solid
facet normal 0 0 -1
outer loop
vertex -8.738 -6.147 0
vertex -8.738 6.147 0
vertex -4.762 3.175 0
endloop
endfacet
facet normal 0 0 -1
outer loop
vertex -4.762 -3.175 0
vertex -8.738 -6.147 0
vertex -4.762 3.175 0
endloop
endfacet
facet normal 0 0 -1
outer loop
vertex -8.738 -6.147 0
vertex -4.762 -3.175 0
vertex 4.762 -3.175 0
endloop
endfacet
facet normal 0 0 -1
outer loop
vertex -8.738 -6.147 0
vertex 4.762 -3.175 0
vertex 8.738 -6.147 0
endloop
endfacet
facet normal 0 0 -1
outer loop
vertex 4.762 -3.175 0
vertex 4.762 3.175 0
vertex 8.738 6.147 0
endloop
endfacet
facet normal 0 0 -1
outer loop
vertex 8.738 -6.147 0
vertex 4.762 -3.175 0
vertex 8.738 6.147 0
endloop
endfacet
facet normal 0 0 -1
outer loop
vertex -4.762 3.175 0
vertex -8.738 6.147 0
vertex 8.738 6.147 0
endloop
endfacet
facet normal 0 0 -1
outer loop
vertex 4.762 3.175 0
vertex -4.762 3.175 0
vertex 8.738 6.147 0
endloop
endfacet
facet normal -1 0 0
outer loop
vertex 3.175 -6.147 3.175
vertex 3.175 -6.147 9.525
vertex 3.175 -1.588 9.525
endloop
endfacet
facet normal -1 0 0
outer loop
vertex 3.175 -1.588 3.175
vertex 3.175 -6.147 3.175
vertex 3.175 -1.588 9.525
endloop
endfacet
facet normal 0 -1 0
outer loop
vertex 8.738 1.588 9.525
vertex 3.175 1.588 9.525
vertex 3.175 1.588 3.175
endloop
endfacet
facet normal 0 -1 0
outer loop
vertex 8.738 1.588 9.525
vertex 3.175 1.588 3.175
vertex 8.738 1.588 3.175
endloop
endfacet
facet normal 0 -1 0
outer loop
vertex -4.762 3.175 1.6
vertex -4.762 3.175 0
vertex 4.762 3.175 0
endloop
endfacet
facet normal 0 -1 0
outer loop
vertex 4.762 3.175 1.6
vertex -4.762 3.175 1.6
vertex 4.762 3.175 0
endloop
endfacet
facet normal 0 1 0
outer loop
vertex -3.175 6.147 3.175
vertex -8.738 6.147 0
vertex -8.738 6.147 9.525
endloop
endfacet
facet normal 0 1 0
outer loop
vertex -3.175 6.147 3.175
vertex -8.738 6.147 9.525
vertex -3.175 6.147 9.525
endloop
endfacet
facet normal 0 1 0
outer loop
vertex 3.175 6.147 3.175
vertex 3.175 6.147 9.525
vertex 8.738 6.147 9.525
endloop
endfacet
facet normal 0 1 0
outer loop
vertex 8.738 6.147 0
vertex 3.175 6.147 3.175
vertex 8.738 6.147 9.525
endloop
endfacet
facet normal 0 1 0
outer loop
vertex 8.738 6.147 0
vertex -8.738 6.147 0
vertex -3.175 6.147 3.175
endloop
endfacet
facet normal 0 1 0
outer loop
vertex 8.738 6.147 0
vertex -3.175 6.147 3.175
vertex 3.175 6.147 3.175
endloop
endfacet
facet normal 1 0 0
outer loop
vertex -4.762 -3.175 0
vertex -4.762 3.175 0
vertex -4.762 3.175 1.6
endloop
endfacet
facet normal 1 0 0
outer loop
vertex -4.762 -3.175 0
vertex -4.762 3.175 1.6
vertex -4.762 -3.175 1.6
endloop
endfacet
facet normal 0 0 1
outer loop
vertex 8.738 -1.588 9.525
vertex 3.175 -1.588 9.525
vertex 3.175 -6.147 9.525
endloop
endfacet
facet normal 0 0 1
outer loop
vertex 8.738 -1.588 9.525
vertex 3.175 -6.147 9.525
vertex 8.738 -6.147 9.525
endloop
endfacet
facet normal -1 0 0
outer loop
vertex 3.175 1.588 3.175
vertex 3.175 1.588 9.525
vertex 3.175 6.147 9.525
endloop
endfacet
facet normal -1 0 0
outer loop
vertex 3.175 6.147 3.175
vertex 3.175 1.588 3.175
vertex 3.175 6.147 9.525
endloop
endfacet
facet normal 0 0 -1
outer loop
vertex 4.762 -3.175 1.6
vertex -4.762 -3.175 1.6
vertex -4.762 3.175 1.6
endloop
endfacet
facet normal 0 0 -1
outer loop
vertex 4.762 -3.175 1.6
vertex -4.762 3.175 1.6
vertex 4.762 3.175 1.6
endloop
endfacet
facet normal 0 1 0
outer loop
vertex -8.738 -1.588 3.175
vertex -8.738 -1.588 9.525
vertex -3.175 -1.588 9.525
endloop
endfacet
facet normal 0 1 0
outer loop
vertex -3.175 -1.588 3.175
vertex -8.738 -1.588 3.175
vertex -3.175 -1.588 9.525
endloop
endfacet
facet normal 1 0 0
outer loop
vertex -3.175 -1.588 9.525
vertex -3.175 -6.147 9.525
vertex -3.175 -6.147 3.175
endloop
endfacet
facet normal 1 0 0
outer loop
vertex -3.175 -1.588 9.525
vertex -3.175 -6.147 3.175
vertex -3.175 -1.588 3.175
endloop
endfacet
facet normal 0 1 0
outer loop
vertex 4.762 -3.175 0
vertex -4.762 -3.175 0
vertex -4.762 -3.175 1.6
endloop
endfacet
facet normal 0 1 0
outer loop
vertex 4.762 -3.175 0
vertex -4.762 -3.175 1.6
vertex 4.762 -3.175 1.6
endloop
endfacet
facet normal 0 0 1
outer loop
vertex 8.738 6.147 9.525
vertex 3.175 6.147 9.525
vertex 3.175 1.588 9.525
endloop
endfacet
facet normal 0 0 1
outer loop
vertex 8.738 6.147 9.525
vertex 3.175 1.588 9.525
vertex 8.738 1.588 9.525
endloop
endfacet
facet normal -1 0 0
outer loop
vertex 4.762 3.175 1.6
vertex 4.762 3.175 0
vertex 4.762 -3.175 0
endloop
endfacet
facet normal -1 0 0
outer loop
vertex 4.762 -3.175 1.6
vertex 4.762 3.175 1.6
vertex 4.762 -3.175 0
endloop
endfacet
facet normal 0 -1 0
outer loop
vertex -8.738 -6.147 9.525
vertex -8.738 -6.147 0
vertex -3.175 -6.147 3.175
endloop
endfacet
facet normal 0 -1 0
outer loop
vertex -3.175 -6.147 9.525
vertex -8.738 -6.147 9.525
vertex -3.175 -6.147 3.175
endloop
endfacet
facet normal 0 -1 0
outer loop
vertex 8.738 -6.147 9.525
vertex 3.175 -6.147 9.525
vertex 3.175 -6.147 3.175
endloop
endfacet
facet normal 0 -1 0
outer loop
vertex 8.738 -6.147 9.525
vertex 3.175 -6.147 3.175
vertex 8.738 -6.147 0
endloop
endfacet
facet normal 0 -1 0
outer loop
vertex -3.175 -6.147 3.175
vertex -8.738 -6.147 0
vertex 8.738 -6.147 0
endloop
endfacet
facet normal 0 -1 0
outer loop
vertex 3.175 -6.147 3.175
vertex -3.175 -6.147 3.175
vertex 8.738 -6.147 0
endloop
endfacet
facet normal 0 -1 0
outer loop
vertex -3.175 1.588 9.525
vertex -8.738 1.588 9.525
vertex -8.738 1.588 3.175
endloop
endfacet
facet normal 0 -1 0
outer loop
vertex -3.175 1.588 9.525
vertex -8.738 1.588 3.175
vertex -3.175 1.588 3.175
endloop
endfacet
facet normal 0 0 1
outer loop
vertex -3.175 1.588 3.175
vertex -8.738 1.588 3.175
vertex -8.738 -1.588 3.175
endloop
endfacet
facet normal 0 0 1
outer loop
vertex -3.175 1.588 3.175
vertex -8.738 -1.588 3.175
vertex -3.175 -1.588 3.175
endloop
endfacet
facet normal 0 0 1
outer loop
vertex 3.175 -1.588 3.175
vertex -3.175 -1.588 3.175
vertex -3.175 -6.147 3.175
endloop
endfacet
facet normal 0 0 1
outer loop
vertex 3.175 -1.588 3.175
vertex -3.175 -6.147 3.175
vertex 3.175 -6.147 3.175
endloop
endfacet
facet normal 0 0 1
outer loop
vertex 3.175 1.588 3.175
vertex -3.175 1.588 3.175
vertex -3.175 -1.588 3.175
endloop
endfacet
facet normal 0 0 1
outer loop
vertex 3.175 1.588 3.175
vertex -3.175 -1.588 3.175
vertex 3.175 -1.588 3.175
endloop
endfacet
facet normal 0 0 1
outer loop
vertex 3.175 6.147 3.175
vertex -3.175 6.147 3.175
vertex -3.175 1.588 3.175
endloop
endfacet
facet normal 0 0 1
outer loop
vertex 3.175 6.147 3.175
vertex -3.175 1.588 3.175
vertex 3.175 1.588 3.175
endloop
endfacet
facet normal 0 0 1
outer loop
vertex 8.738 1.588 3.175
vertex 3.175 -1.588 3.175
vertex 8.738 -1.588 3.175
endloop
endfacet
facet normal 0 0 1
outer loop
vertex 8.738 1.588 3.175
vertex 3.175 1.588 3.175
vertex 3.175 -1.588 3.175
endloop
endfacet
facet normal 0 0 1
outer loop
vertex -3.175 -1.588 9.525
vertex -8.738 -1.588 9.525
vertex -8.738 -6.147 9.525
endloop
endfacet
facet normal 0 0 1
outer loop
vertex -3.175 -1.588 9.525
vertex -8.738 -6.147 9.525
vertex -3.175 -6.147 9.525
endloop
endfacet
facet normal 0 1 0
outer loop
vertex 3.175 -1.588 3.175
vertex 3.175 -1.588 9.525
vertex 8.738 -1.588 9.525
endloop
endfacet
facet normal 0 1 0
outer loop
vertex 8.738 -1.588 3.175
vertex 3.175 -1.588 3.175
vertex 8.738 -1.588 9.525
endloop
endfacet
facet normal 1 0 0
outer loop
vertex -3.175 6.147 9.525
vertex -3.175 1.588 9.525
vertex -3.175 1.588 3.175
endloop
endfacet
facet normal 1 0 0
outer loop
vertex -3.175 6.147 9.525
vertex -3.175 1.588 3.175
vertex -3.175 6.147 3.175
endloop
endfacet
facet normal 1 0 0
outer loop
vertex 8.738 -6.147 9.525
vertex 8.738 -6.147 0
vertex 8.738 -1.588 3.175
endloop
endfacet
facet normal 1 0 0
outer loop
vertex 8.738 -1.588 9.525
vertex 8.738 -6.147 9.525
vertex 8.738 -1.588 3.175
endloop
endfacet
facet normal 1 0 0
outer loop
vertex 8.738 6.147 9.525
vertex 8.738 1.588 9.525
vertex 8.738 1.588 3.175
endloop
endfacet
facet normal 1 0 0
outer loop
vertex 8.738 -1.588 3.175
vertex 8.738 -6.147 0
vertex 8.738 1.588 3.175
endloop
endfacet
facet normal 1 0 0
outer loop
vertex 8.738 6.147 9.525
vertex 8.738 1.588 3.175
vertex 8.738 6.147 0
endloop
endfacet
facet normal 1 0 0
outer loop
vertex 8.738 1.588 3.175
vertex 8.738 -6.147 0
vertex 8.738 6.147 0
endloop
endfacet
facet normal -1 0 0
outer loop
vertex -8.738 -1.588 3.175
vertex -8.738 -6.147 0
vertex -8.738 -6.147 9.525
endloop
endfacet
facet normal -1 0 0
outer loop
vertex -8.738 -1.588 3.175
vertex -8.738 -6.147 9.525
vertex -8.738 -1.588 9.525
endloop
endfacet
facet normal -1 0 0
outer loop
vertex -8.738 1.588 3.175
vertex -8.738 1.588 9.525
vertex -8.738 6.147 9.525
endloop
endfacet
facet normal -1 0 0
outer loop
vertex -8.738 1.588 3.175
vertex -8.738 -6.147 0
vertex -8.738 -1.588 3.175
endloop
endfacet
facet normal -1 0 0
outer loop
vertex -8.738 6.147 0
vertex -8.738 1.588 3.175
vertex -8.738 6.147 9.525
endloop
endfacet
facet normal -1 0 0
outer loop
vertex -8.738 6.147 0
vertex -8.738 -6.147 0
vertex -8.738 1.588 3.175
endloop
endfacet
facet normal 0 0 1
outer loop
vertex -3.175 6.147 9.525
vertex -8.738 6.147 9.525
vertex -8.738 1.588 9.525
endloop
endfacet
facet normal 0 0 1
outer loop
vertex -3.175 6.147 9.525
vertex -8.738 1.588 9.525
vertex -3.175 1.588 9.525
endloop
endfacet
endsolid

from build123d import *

# Parameters (mm, degrees)
F0_W     = 17.4752
F0_H     = 12.2936
F1_DEPTH = 9.525
F2_W     = 6.35
F2_H     = 12.2936
F3_DEPTH = 6.35
F4_W     = 17.4752
F4_H     = 3.175
F5_DEPTH = 6.35
F6_W     = 9.525
F6_H     = 6.35
F7_DEPTH = 1.6002


with BuildPart() as f1:
    # F0 (on Top) → F1 (new body)
    with BuildSketch(Plane.XY):
        Rectangle(F0_W, F0_H)
    extrude(amount=F1_DEPTH)

    # F2 (on face) → F3 (cut)
    with BuildSketch(Plane.XY.offset(9.525)):
        Rectangle(F2_W, F2_H)
    extrude(amount=-F3_DEPTH, mode=Mode.SUBTRACT)

    # F4 (on face) → F5 (cut)
    with BuildSketch(Plane.XY.offset(9.525)):
        Rectangle(F4_W, F4_H)
    extrude(amount=-F5_DEPTH, mode=Mode.SUBTRACT)

    # F6 (on face) → F7 (cut)
    with BuildSketch(Plane(origin=(0, 0, 0), x_dir=(1, 0, 0), z_dir=(0, 0, -1))):
        Rectangle(F6_W, F6_H)
    extrude(amount=-F7_DEPTH, mode=Mode.SUBTRACT)


solid = f1.part
